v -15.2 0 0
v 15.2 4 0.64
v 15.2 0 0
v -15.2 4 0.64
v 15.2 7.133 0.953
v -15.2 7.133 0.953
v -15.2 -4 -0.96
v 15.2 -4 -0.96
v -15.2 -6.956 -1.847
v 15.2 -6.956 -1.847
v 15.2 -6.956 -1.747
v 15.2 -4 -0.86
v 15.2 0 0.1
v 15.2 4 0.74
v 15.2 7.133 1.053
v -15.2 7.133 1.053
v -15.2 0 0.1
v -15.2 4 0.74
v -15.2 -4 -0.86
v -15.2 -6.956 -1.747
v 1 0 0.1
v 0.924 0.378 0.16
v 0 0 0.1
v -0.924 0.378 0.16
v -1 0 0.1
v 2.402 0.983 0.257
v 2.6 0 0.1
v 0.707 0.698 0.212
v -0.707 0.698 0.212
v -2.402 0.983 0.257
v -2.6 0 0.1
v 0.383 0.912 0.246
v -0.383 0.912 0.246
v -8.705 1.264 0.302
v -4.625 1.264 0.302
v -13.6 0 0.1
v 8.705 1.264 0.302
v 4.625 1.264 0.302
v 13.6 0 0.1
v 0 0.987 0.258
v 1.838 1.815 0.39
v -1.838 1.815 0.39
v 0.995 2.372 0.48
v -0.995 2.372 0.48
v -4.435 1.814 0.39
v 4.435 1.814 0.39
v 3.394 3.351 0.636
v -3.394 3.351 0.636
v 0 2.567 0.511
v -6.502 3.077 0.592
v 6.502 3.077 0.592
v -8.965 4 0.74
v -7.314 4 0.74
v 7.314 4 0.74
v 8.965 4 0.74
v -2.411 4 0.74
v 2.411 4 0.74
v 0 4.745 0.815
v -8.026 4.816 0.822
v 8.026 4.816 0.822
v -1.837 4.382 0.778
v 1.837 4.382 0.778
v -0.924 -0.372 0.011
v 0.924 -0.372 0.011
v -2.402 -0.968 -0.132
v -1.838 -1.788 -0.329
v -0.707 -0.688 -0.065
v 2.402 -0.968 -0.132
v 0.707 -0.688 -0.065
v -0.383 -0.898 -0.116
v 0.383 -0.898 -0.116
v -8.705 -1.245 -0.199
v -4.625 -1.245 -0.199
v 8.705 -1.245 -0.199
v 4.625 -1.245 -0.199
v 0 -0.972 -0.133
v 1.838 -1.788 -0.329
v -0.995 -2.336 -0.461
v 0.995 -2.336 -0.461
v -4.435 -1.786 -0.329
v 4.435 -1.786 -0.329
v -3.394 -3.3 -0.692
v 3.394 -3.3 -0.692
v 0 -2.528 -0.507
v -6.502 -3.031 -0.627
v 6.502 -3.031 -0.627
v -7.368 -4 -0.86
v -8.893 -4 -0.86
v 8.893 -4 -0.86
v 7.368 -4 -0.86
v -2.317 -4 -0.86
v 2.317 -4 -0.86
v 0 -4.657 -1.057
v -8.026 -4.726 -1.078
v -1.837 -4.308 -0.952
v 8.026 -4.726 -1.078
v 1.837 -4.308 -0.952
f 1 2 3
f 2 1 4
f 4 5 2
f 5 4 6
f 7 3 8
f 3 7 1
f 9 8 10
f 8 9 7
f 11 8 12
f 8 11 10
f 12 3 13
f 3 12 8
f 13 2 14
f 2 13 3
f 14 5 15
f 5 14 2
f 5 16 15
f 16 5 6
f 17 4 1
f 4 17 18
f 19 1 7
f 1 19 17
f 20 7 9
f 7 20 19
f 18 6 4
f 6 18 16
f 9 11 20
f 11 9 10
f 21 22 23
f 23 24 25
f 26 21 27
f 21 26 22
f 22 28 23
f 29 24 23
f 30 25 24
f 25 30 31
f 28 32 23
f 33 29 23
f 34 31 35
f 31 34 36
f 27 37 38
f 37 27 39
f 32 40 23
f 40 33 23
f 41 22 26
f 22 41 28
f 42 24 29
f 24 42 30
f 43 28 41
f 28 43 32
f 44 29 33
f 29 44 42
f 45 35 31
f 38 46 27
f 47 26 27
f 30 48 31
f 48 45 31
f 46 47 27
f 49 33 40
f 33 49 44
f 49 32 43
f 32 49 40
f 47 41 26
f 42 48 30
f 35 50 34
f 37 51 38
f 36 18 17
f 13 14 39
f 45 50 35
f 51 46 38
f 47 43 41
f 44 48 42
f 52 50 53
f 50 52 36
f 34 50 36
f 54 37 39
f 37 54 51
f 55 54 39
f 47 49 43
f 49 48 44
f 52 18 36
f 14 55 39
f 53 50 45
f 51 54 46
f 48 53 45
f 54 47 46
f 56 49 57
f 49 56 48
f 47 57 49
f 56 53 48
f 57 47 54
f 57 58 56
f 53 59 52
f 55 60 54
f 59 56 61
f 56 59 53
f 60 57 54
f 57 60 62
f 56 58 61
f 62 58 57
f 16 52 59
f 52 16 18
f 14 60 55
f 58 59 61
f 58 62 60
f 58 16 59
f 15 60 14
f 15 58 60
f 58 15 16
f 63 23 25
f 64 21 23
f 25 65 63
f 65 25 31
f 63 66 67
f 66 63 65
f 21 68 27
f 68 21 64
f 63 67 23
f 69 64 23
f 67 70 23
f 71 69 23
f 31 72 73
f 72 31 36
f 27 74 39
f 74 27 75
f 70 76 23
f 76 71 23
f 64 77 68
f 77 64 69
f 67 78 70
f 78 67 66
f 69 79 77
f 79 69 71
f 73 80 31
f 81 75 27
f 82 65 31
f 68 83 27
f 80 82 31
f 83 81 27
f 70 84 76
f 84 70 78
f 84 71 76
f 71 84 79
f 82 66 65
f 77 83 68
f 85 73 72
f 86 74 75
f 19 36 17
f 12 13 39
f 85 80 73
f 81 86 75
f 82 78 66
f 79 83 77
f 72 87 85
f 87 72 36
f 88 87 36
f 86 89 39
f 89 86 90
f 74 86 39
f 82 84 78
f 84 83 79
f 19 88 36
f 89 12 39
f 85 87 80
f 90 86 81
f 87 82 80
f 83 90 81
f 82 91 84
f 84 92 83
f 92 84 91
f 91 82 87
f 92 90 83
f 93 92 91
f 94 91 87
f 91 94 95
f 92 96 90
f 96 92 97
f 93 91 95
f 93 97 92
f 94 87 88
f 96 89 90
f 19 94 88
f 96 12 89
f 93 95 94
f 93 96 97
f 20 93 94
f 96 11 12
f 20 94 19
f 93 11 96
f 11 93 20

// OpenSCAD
use <../lib.scad>
function ldraw_lib__4638848ic01() = [
// 0 Sticker  1.8 x  3.8 with Black Train Logo (2006, Bold) on Yellow Background (Formed)
// 0 Name: 4638848ic01.dat
// 0 Author: Gerald Lasser [GeraldLasser]
// 0 !LDRAW_ORG Part UPDATE 2023-07
// 0 !LICENSE Licensed under CC BY 4.0 : see CAreadme.txt
// 
// 0 !HELP !ATTACHTO 52031.dat 0 2.6 -50 1 0 0 0 1 0 0 0 1
// 
// 0 BFC CERTIFY CCW
  [0,"BFC","CERTIFY"],
  [0,"BFC","CCW"],
// 
// 0 !KEYWORDS Set 3677
// 
// 0 !HISTORY 2023-12-31 [OrionP] Official Update 2023-07
// 
// 
// 0 // Sticker Box
// 4 16 -38 -1.6 10 38 -1.6 10 38 0 0 -38 0 0
  [4,16,-38,-1.6,10,38,-1.6,10,38,0,0,-38,0,0],
// 4 16 -38 -2.3834 17.8337 38 -2.3834 17.8337 38 -1.6 10 -38 -1.6 10
  [4,16,-38,-2.3834,17.8337,38,-2.3834,17.8337,38,-1.6,10,-38,-1.6,10],
// 4 16 38 0 0 38 2.4 -10 -38 2.4 -10 -38 0 0
  [4,16,38,0,0,38,2.4,-10,-38,2.4,-10,-38,0,0],
// 4 16 38 2.4 -10 38 4.6172 -17.3906 -38 4.6172 -17.3906 -38 2.4 -10
  [4,16,38,2.4,-10,38,4.6172,-17.3906,-38,4.6172,-17.3906,-38,2.4,-10],
// 4 16 38 2.15 -10 38 4.3672 -17.3906 38 4.6172 -17.3906 38 2.4 -10
  [4,16,38,2.15,-10,38,4.3672,-17.3906,38,4.6172,-17.3906,38,2.4,-10],
// 4 16 38 -.25 0 38 2.15 -10 38 2.4 -10 38 0 0
  [4,16,38,-.25,0,38,2.15,-10,38,2.4,-10,38,0,0],
// 4 16 38 -1.85 10 38 -.25 0 38 0 0 38 -1.6 10
  [4,16,38,-1.85,10,38,-.25,0,38,0,0,38,-1.6,10],
// 4 16 38 -2.6334 17.8337 38 -1.85 10 38 -1.6 10 38 -2.3834 17.8337
  [4,16,38,-2.6334,17.8337,38,-1.85,10,38,-1.6,10,38,-2.3834,17.8337],
// 4 16 -38 -2.6334 17.8337 38 -2.6334 17.8337 38 -2.3834 17.8337 -38 -2.3834 17.8337
  [4,16,-38,-2.6334,17.8337,38,-2.6334,17.8337,38,-2.3834,17.8337,-38,-2.3834,17.8337],
// 4 16 -38 -.25 0 -38 -1.85 10 -38 -1.6 10 -38 0 0
  [4,16,-38,-.25,0,-38,-1.85,10,-38,-1.6,10,-38,0,0],
// 4 16 -38 2.15 -10 -38 -.25 0 -38 0 0 -38 2.4 -10
  [4,16,-38,2.15,-10,-38,-.25,0,-38,0,0,-38,2.4,-10],
// 4 16 -38 2.15 -10 -38 2.4 -10 -38 4.6172 -17.3906 -38 4.3672 -17.3906
  [4,16,-38,2.15,-10,-38,2.4,-10,-38,4.6172,-17.3906,-38,4.3672,-17.3906],
// 4 16 -38 -1.85 10 -38 -2.6334 17.8337 -38 -2.3834 17.8337 -38 -1.6 10
  [4,16,-38,-1.85,10,-38,-2.6334,17.8337,-38,-2.3834,17.8337,-38,-1.6,10],
// 4 16 38 4.3672 -17.3906 -38 4.3672 -17.3906 -38 4.6172 -17.3906 38 4.6172 -17.3906
  [4,16,38,4.3672,-17.3906,-38,4.3672,-17.3906,-38,4.6172,-17.3906,38,4.6172,-17.3906],
// 
// 0 // Pattern
// 3 0 2.5 -.25 0 2.3098 -.4012 .9447 0 -.25 0
  [3,0,2.5,-.25,0,2.3098,-.4012,.9447,0,-.25,0],
// 3 0 0 -.25 0 -2.3098 -.4012 .9447 -2.5 -.25 0
  [3,0,0,-.25,0,-2.3098,-.4012,.9447,-2.5,-.25,0],
// 4 14 6.5 -.25 0 6.0053 -.643 2.4563 2.3098 -.4012 .9447 2.5 -.25 0
  [4,14,6.5,-.25,0,6.0053,-.643,2.4563,2.3098,-.4012,.9447,2.5,-.25,0],
// 3 0 2.3098 -.4012 .9447 1.7677 -.5293 1.7455 0 -.25 0
  [3,0,2.3098,-.4012,.9447,1.7677,-.5293,1.7455,0,-.25,0],
// 3 0 -1.7677 -.5293 1.7455 -2.3098 -.4012 .9447 0 -.25 0
  [3,0,-1.7677,-.5293,1.7455,-2.3098,-.4012,.9447,0,-.25,0],
// 4 14 -6.5 -.25 0 -2.5 -.25 0 -2.3098 -.4012 .9447 -6.0053 -.643 2.4563
  [4,14,-6.5,-.25,0,-2.5,-.25,0,-2.3098,-.4012,.9447,-6.0053,-.643,2.4563],
// 3 0 1.7677 -.5293 1.7455 .9567 -.6149 2.2807 0 -.25 0
  [3,0,1.7677,-.5293,1.7455,.9567,-.6149,2.2807,0,-.25,0],
// 3 0 -.9567 -.6149 2.2807 -1.7677 -.5293 1.7455 0 -.25 0
  [3,0,-.9567,-.6149,2.2807,-1.7677,-.5293,1.7455,0,-.25,0],
// 4 0 -6.5 -.25 0 -11.5625 -.7556 3.1598 -21.7625 -.7556 3.1598 -34 -.25 0
  [4,0,-6.5,-.25,0,-11.5625,-.7556,3.1598,-21.7625,-.7556,3.1598,-34,-.25,0],
// 4 0 34 -.25 0 21.7625 -.7556 3.1598 11.5625 -.7556 3.1598 6.5 -.25 0
  [4,0,34,-.25,0,21.7625,-.7556,3.1598,11.5625,-.7556,3.1598,6.5,-.25,0],
// 3 0 .9567 -.6149 2.2807 0 -.645 2.4686 0 -.25 0
  [3,0,.9567,-.6149,2.2807,0,-.645,2.4686,0,-.25,0],
// 3 0 0 -.645 2.4686 -.9567 -.6149 2.2807 0 -.25 0
  [3,0,0,-.645,2.4686,-.9567,-.6149,2.2807,0,-.25,0],
// 4 14 6.0053 -.643 2.4563 4.5961 -.9761 4.5384 1.7677 -.5293 1.7455 2.3098 -.4012 .9447
  [4,14,6.0053,-.643,2.4563,4.5961,-.9761,4.5384,1.7677,-.5293,1.7455,2.3098,-.4012,.9447],
// 4 14 -6.0053 -.643 2.4563 -2.3098 -.4012 .9447 -1.7677 -.5293 1.7455 -4.5961 -.9761 4.5384
  [4,14,-6.0053,-.643,2.4563,-2.3098,-.4012,.9447,-1.7677,-.5293,1.7455,-4.5961,-.9761,4.5384],
// 4 14 2.4876 -1.1988 5.9299 .9567 -.6149 2.2807 1.7677 -.5293 1.7455 4.5961 -.9761 4.5384
  [4,14,2.4876,-1.1988,5.9299,.9567,-.6149,2.2807,1.7677,-.5293,1.7455,4.5961,-.9761,4.5384],
// 4 14 -1.7677 -.5293 1.7455 -.9567 -.6149 2.2807 -2.4876 -1.1988 5.9299 -4.5961 -.9761 4.5384
  [4,14,-1.7677,-.5293,1.7455,-.9567,-.6149,2.2807,-2.4876,-1.1988,5.9299,-4.5961,-.9761,4.5384],
// 3 0 -11.0868 -.9756 4.5347 -11.5625 -.7556 3.1598 -6.5 -.25 0
  [3,0,-11.0868,-.9756,4.5347,-11.5625,-.7556,3.1598,-6.5,-.25,0],
// 3 0 11.5625 -.7556 3.1598 11.0868 -.9756 4.5347 6.5 -.25 0
  [3,0,11.5625,-.7556,3.1598,11.0868,-.9756,4.5347,6.5,-.25,0],
// 3 0 8.4852 -1.5906 8.3786 6.0053 -.643 2.4563 6.5 -.25 0
  [3,0,8.4852,-1.5906,8.3786,6.0053,-.643,2.4563,6.5,-.25,0],
// 3 0 -6.0053 -.643 2.4563 -8.4852 -1.5906 8.3786 -6.5 -.25 0
  [3,0,-6.0053,-.643,2.4563,-8.4852,-1.5906,8.3786,-6.5,-.25,0],
// 3 0 -8.4852 -1.5906 8.3786 -11.0868 -.9756 4.5347 -6.5 -.25 0
  [3,0,-8.4852,-1.5906,8.3786,-11.0868,-.9756,4.5347,-6.5,-.25,0],
// 3 0 11.0868 -.9756 4.5347 8.4852 -1.5906 8.3786 6.5 -.25 0
  [3,0,11.0868,-.9756,4.5347,8.4852,-1.5906,8.3786,6.5,-.25,0],
// 4 14 -.9567 -.6149 2.2807 0 -.645 2.4686 0 -1.2769 6.4184 -2.4876 -1.1988 5.9299
  [4,14,-.9567,-.6149,2.2807,0,-.645,2.4686,0,-1.2769,6.4184,-2.4876,-1.1988,5.9299],
// 4 14 .9567 -.6149 2.2807 2.4876 -1.1988 5.9299 0 -1.2769 6.4184 0 -.645 2.4686
  [4,14,.9567,-.6149,2.2807,2.4876,-1.1988,5.9299,0,-1.2769,6.4184,0,-.645,2.4686],
// 3 0 8.4852 -1.5906 8.3786 4.5961 -.9761 4.5384 6.0053 -.643 2.4563
  [3,0,8.4852,-1.5906,8.3786,4.5961,-.9761,4.5384,6.0053,-.643,2.4563],
// 3 0 -4.5961 -.9761 4.5384 -8.4852 -1.5906 8.3786 -6.0053 -.643 2.4563
  [3,0,-4.5961,-.9761,4.5384,-8.4852,-1.5906,8.3786,-6.0053,-.643,2.4563],
// 3 14 -11.5625 -.7556 3.1598 -16.255 -1.481 7.6936 -21.7625 -.7556 3.1598
  [3,14,-11.5625,-.7556,3.1598,-16.255,-1.481,7.6936,-21.7625,-.7556,3.1598],
// 3 14 21.7625 -.7556 3.1598 16.255 -1.481 7.6936 11.5625 -.7556 3.1598
  [3,14,21.7625,-.7556,3.1598,16.255,-1.481,7.6936,11.5625,-.7556,3.1598],
// 3 14 -34 -.25 0 -38 -1.85 10 -38 -.25 0
  [3,14,-34,-.25,0,-38,-1.85,10,-38,-.25,0],
// 3 14 38 -.25 0 38 -1.85 10 34 -.25 0
  [3,14,38,-.25,0,38,-1.85,10,34,-.25,0],
// 3 14 -11.0868 -.9756 4.5347 -16.255 -1.481 7.6936 -11.5625 -.7556 3.1598
  [3,14,-11.0868,-.9756,4.5347,-16.255,-1.481,7.6936,-11.5625,-.7556,3.1598],
// 3 14 16.255 -1.481 7.6936 11.0868 -.9756 4.5347 11.5625 -.7556 3.1598
  [3,14,16.255,-1.481,7.6936,11.0868,-.9756,4.5347,11.5625,-.7556,3.1598],
// 3 0 8.4852 -1.5906 8.3786 2.4876 -1.1988 5.9299 4.5961 -.9761 4.5384
  [3,0,8.4852,-1.5906,8.3786,2.4876,-1.1988,5.9299,4.5961,-.9761,4.5384],
// 3 0 -2.4876 -1.1988 5.9299 -8.4852 -1.5906 8.3786 -4.5961 -.9761 4.5384
  [3,0,-2.4876,-1.1988,5.9299,-8.4852,-1.5906,8.3786,-4.5961,-.9761,4.5384],
// 4 0 -16.255 -1.481 7.6936 -18.2845 -1.85 10 -22.4125 -1.85 10 -34 -.25 0
  [4,0,-16.255,-1.481,7.6936,-18.2845,-1.85,10,-22.4125,-1.85,10,-34,-.25,0],
// 3 0 -21.7625 -.7556 3.1598 -16.255 -1.481 7.6936 -34 -.25 0
  [3,0,-21.7625,-.7556,3.1598,-16.255,-1.481,7.6936,-34,-.25,0],
// 4 0 18.2845 -1.85 10 16.255 -1.481 7.6936 21.7625 -.7556 3.1598 34 -.25 0
  [4,0,18.2845,-1.85,10,16.255,-1.481,7.6936,21.7625,-.7556,3.1598,34,-.25,0],
// 3 0 22.4125 -1.85 10 18.2845 -1.85 10 34 -.25 0
  [3,0,22.4125,-1.85,10,18.2845,-1.85,10,34,-.25,0],
// 3 0 8.4852 -1.5906 8.3786 0 -1.2769 6.4184 2.4876 -1.1988 5.9299
  [3,0,8.4852,-1.5906,8.3786,0,-1.2769,6.4184,2.4876,-1.1988,5.9299],
// 3 0 0 -1.2769 6.4184 -8.4852 -1.5906 8.3786 -2.4876 -1.1988 5.9299
  [3,0,0,-1.2769,6.4184,-8.4852,-1.5906,8.3786,-2.4876,-1.1988,5.9299],
// 3 14 -22.4125 -1.85 10 -38 -1.85 10 -34 -.25 0
  [3,14,-22.4125,-1.85,10,-38,-1.85,10,-34,-.25,0],
// 3 14 38 -1.85 10 22.4125 -1.85 10 34 -.25 0
  [3,14,38,-1.85,10,22.4125,-1.85,10,34,-.25,0],
// 3 14 -18.2845 -1.85 10 -16.255 -1.481 7.6936 -11.0868 -.9756 4.5347
  [3,14,-18.2845,-1.85,10,-16.255,-1.481,7.6936,-11.0868,-.9756,4.5347],
// 3 14 16.255 -1.481 7.6936 18.2845 -1.85 10 11.0868 -.9756 4.5347
  [3,14,16.255,-1.481,7.6936,18.2845,-1.85,10,11.0868,-.9756,4.5347],
// 3 14 -8.4852 -1.5906 8.3786 -18.2845 -1.85 10 -11.0868 -.9756 4.5347
  [3,14,-8.4852,-1.5906,8.3786,-18.2845,-1.85,10,-11.0868,-.9756,4.5347],
// 3 14 18.2845 -1.85 10 8.4852 -1.5906 8.3786 11.0868 -.9756 4.5347
  [3,14,18.2845,-1.85,10,8.4852,-1.5906,8.3786,11.0868,-.9756,4.5347],
// 4 0 6.0283 -1.85 10 -6.0283 -1.85 10 -8.4852 -1.5906 8.3786 0 -1.2769 6.4184
  [4,0,6.0283,-1.85,10,-6.0283,-1.85,10,-8.4852,-1.5906,8.3786,0,-1.2769,6.4184],
// 3 0 8.4852 -1.5906 8.3786 6.0283 -1.85 10 0 -1.2769 6.4184
  [3,0,8.4852,-1.5906,8.3786,6.0283,-1.85,10,0,-1.2769,6.4184],
// 3 14 -6.0283 -1.85 10 -18.2845 -1.85 10 -8.4852 -1.5906 8.3786
  [3,14,-6.0283,-1.85,10,-18.2845,-1.85,10,-8.4852,-1.5906,8.3786],
// 3 14 6.0283 -1.85 10 8.4852 -1.5906 8.3786 18.2845 -1.85 10
  [3,14,6.0283,-1.85,10,8.4852,-1.5906,8.3786,18.2845,-1.85,10],
// 3 0 6.0283 -1.85 10 0 -2.0364 11.8635 -6.0283 -1.85 10
  [3,0,6.0283,-1.85,10,0,-2.0364,11.8635,-6.0283,-1.85,10],
// 3 0 -18.2845 -1.85 10 -20.0662 -2.054 12.0404 -22.4125 -1.85 10
  [3,0,-18.2845,-1.85,10,-20.0662,-2.054,12.0404,-22.4125,-1.85,10],
// 3 0 22.4125 -1.85 10 20.0662 -2.054 12.0404 18.2845 -1.85 10
  [3,0,22.4125,-1.85,10,20.0662,-2.054,12.0404,18.2845,-1.85,10],
// 4 14 -6.0283 -1.85 10 -4.5924 -1.9455 10.9548 -20.0662 -2.054 12.0404 -18.2845 -1.85 10
  [4,14,-6.0283,-1.85,10,-4.5924,-1.9455,10.9548,-20.0662,-2.054,12.0404,-18.2845,-1.85,10],
// 4 14 20.0662 -2.054 12.0404 4.5924 -1.9455 10.9548 6.0283 -1.85 10 18.2845 -1.85 10
  [4,14,20.0662,-2.054,12.0404,4.5924,-1.9455,10.9548,6.0283,-1.85,10,18.2845,-1.85,10],
// 3 0 -6.0283 -1.85 10 0 -2.0364 11.8635 -4.5924 -1.9455 10.9548
  [3,0,-6.0283,-1.85,10,0,-2.0364,11.8635,-4.5924,-1.9455,10.9548],
// 3 0 4.5924 -1.9455 10.9548 0 -2.0364 11.8635 6.0283 -1.85 10
  [3,0,4.5924,-1.9455,10.9548,0,-2.0364,11.8635,6.0283,-1.85,10],
// 4 14 -22.4125 -1.85 10 -20.0662 -2.054 12.0404 -38 -2.6334 17.8337 -38 -1.85 10
  [4,14,-22.4125,-1.85,10,-20.0662,-2.054,12.0404,-38,-2.6334,17.8337,-38,-1.85,10],
// 3 14 38 -1.85 10 20.0662 -2.054 12.0404 22.4125 -1.85 10
  [3,14,38,-1.85,10,20.0662,-2.054,12.0404,22.4125,-1.85,10],
// 3 14 0 -2.0364 11.8635 -20.0662 -2.054 12.0404 -4.5924 -1.9455 10.9548
  [3,14,0,-2.0364,11.8635,-20.0662,-2.054,12.0404,-4.5924,-1.9455,10.9548],
// 3 14 0 -2.0364 11.8635 4.5924 -1.9455 10.9548 20.0662 -2.054 12.0404
  [3,14,0,-2.0364,11.8635,4.5924,-1.9455,10.9548,20.0662,-2.054,12.0404],
// 3 14 0 -2.0364 11.8635 -38 -2.6334 17.8337 -20.0662 -2.054 12.0404
  [3,14,0,-2.0364,11.8635,-38,-2.6334,17.8337,-20.0662,-2.054,12.0404],
// 3 14 38 -2.6334 17.8337 20.0662 -2.054 12.0404 38 -1.85 10
  [3,14,38,-2.6334,17.8337,20.0662,-2.054,12.0404,38,-1.85,10],
// 4 14 20.0662 -2.054 12.0404 38 -2.6334 17.8337 -38 -2.6334 17.8337 0 -2.0364 11.8635
  [4,14,20.0662,-2.054,12.0404,38,-2.6334,17.8337,-38,-2.6334,17.8337,0,-2.0364,11.8635],
// 3 0 -2.3098 -.0267 -.9303 0 -.25 0 -2.5 -.25 0
  [3,0,-2.3098,-.0267,-.9303,0,-.25,0,-2.5,-.25,0],
// 3 0 2.3098 -.0267 -.9303 2.5 -.25 0 0 -.25 0
  [3,0,2.3098,-.0267,-.9303,2.5,-.25,0,0,-.25,0],
// 4 14 -6.5 -.25 0 -6.0053 .3305 -2.4189 -2.3098 -.0267 -.9303 -2.5 -.25 0
  [4,14,-6.5,-.25,0,-6.0053,.3305,-2.4189,-2.3098,-.0267,-.9303,-2.5,-.25,0],
// 4 14 -1.7677 .1625 -1.7189 -2.3098 -.0267 -.9303 -6.0053 .3305 -2.4189 -4.5961 .8226 -4.4692
  [4,14,-1.7677,.1625,-1.7189,-2.3098,-.0267,-.9303,-6.0053,.3305,-2.4189,-4.5961,.8226,-4.4692],
// 4 14 2.3098 -.0267 -.9303 6.0053 .3305 -2.4189 6.5 -.25 0 2.5 -.25 0
  [4,14,2.3098,-.0267,-.9303,6.0053,.3305,-2.4189,6.5,-.25,0,2.5,-.25,0],
// 3 0 -2.3098 -.0267 -.9303 -1.7677 .1625 -1.7189 0 -.25 0
  [3,0,-2.3098,-.0267,-.9303,-1.7677,.1625,-1.7189,0,-.25,0],
// 3 0 1.7677 .1625 -1.7189 2.3098 -.0267 -.9303 0 -.25 0
  [3,0,1.7677,.1625,-1.7189,2.3098,-.0267,-.9303,0,-.25,0],
// 3 0 -1.7677 .1625 -1.7189 -.9567 .289 -2.246 0 -.25 0
  [3,0,-1.7677,.1625,-1.7189,-.9567,.289,-2.246,0,-.25,0],
// 3 0 .9567 .289 -2.246 1.7677 .1625 -1.7189 0 -.25 0
  [3,0,.9567,.289,-2.246,1.7677,.1625,-1.7189,0,-.25,0],
// 4 0 -21.7625 .4968 -3.1116 -11.5625 .4968 -3.1116 -6.5 -.25 0 -34 -.25 0
  [4,0,-21.7625,.4968,-3.1116,-11.5625,.4968,-3.1116,-6.5,-.25,0,-34,-.25,0],
// 4 0 11.5625 .4968 -3.1116 21.7625 .4968 -3.1116 34 -.25 0 6.5 -.25 0
  [4,0,11.5625,.4968,-3.1116,21.7625,.4968,-3.1116,34,-.25,0,6.5,-.25,0],
// 3 0 -.9567 .289 -2.246 0 .3334 -2.431 0 -.25 0
  [3,0,-.9567,.289,-2.246,0,.3334,-2.431,0,-.25,0],
// 3 0 0 .3334 -2.431 .9567 .289 -2.246 0 -.25 0
  [3,0,0,.3334,-2.431,.9567,.289,-2.246,0,-.25,0],
// 4 14 6.0053 .3305 -2.4189 2.3098 -.0267 -.9303 1.7677 .1625 -1.7189 4.5961 .8226 -4.4692
  [4,14,6.0053,.3305,-2.4189,2.3098,-.0267,-.9303,1.7677,.1625,-1.7189,4.5961,.8226,-4.4692],
// 4 14 -2.4876 1.1515 -5.8395 -.9567 .289 -2.246 -1.7677 .1625 -1.7189 -4.5961 .8226 -4.4692
  [4,14,-2.4876,1.1515,-5.8395,-.9567,.289,-2.246,-1.7677,.1625,-1.7189,-4.5961,.8226,-4.4692],
// 4 14 1.7677 .1625 -1.7189 .9567 .289 -2.246 2.4876 1.1515 -5.8395 4.5961 .8226 -4.4692
  [4,14,1.7677,.1625,-1.7189,.9567,.289,-2.246,2.4876,1.1515,-5.8395,4.5961,.8226,-4.4692],
// 3 0 -11.5625 .4968 -3.1116 -11.0868 .8217 -4.4656 -6.5 -.25 0
  [3,0,-11.5625,.4968,-3.1116,-11.0868,.8217,-4.4656,-6.5,-.25,0],
// 3 0 11.0868 .8217 -4.4656 11.5625 .4968 -3.1116 6.5 -.25 0
  [3,0,11.0868,.8217,-4.4656,11.5625,.4968,-3.1116,6.5,-.25,0],
// 3 0 -8.4852 1.7302 -8.2509 -6.0053 .3305 -2.4189 -6.5 -.25 0
  [3,0,-8.4852,1.7302,-8.2509,-6.0053,.3305,-2.4189,-6.5,-.25,0],
// 3 0 6.0053 .3305 -2.4189 8.4852 1.7302 -8.2509 6.5 -.25 0
  [3,0,6.0053,.3305,-2.4189,8.4852,1.7302,-8.2509,6.5,-.25,0],
// 3 0 -11.0868 .8217 -4.4656 -8.4852 1.7302 -8.2509 -6.5 -.25 0
  [3,0,-11.0868,.8217,-4.4656,-8.4852,1.7302,-8.2509,-6.5,-.25,0],
// 3 0 8.4852 1.7302 -8.2509 11.0868 .8217 -4.4656 6.5 -.25 0
  [3,0,8.4852,1.7302,-8.2509,11.0868,.8217,-4.4656,6.5,-.25,0],
// 4 14 -.9567 .289 -2.246 -2.4876 1.1515 -5.8395 0 1.2669 -6.3205 0 .3334 -2.431
  [4,14,-.9567,.289,-2.246,-2.4876,1.1515,-5.8395,0,1.2669,-6.3205,0,.3334,-2.431],
// 4 14 .9567 .289 -2.246 0 .3334 -2.431 0 1.2669 -6.3205 2.4876 1.1515 -5.8395
  [4,14,.9567,.289,-2.246,0,.3334,-2.431,0,1.2669,-6.3205,2.4876,1.1515,-5.8395],
// 3 0 -8.4852 1.7302 -8.2509 -4.5961 .8226 -4.4692 -6.0053 .3305 -2.4189
  [3,0,-8.4852,1.7302,-8.2509,-4.5961,.8226,-4.4692,-6.0053,.3305,-2.4189],
// 3 0 4.5961 .8226 -4.4692 8.4852 1.7302 -8.2509 6.0053 .3305 -2.4189
  [3,0,4.5961,.8226,-4.4692,8.4852,1.7302,-8.2509,6.0053,.3305,-2.4189],
// 3 14 -16.255 1.5683 -7.5764 -11.5625 .4968 -3.1116 -21.7625 .4968 -3.1116
  [3,14,-16.255,1.5683,-7.5764,-11.5625,.4968,-3.1116,-21.7625,.4968,-3.1116],
// 3 14 16.255 1.5683 -7.5764 21.7625 .4968 -3.1116 11.5625 .4968 -3.1116
  [3,14,16.255,1.5683,-7.5764,21.7625,.4968,-3.1116,11.5625,.4968,-3.1116],
// 3 14 -38 2.15 -10 -34 -.25 0 -38 -.25 0
  [3,14,-38,2.15,-10,-34,-.25,0,-38,-.25,0],
// 3 14 38 2.15 -10 38 -.25 0 34 -.25 0
  [3,14,38,2.15,-10,38,-.25,0,34,-.25,0],
// 3 14 -16.255 1.5683 -7.5764 -11.0868 .8217 -4.4656 -11.5625 .4968 -3.1116
  [3,14,-16.255,1.5683,-7.5764,-11.0868,.8217,-4.4656,-11.5625,.4968,-3.1116],
// 3 14 11.0868 .8217 -4.4656 16.255 1.5683 -7.5764 11.5625 .4968 -3.1116
  [3,14,11.0868,.8217,-4.4656,16.255,1.5683,-7.5764,11.5625,.4968,-3.1116],
// 3 0 -8.4852 1.7302 -8.2509 -2.4876 1.1515 -5.8395 -4.5961 .8226 -4.4692
  [3,0,-8.4852,1.7302,-8.2509,-2.4876,1.1515,-5.8395,-4.5961,.8226,-4.4692],
// 3 0 2.4876 1.1515 -5.8395 8.4852 1.7302 -8.2509 4.5961 .8226 -4.4692
  [3,0,2.4876,1.1515,-5.8395,8.4852,1.7302,-8.2509,4.5961,.8226,-4.4692],
// 4 0 -18.4207 2.15 -10 -16.255 1.5683 -7.5764 -21.7625 .4968 -3.1116 -34 -.25 0
  [4,0,-18.4207,2.15,-10,-16.255,1.5683,-7.5764,-21.7625,.4968,-3.1116,-34,-.25,0],
// 3 0 -22.2331 2.15 -10 -18.4207 2.15 -10 -34 -.25 0
  [3,0,-22.2331,2.15,-10,-18.4207,2.15,-10,-34,-.25,0],
// 4 0 16.255 1.5683 -7.5764 18.4207 2.15 -10 22.2331 2.15 -10 34 -.25 0
  [4,0,16.255,1.5683,-7.5764,18.4207,2.15,-10,22.2331,2.15,-10,34,-.25,0],
// 3 0 21.7625 .4968 -3.1116 16.255 1.5683 -7.5764 34 -.25 0
  [3,0,21.7625,.4968,-3.1116,16.255,1.5683,-7.5764,34,-.25,0],
// 3 0 -8.4852 1.7302 -8.2509 0 1.2669 -6.3205 -2.4876 1.1515 -5.8395
  [3,0,-8.4852,1.7302,-8.2509,0,1.2669,-6.3205,-2.4876,1.1515,-5.8395],
// 3 0 0 1.2669 -6.3205 8.4852 1.7302 -8.2509 2.4876 1.1515 -5.8395
  [3,0,0,1.2669,-6.3205,8.4852,1.7302,-8.2509,2.4876,1.1515,-5.8395],
// 3 14 -38 2.15 -10 -22.2331 2.15 -10 -34 -.25 0
  [3,14,-38,2.15,-10,-22.2331,2.15,-10,-34,-.25,0],
// 3 14 22.2331 2.15 -10 38 2.15 -10 34 -.25 0
  [3,14,22.2331,2.15,-10,38,2.15,-10,34,-.25,0],
// 3 14 -16.255 1.5683 -7.5764 -18.4207 2.15 -10 -11.0868 .8217 -4.4656
  [3,14,-16.255,1.5683,-7.5764,-18.4207,2.15,-10,-11.0868,.8217,-4.4656],
// 3 14 18.4207 2.15 -10 16.255 1.5683 -7.5764 11.0868 .8217 -4.4656
  [3,14,18.4207,2.15,-10,16.255,1.5683,-7.5764,11.0868,.8217,-4.4656],
// 3 14 -18.4207 2.15 -10 -8.4852 1.7302 -8.2509 -11.0868 .8217 -4.4656
  [3,14,-18.4207,2.15,-10,-8.4852,1.7302,-8.2509,-11.0868,.8217,-4.4656],
// 3 14 8.4852 1.7302 -8.2509 18.4207 2.15 -10 11.0868 .8217 -4.4656
  [3,14,8.4852,1.7302,-8.2509,18.4207,2.15,-10,11.0868,.8217,-4.4656],
// 3 0 -8.4852 1.7302 -8.2509 -5.7937 2.15 -10 0 1.2669 -6.3205
  [3,0,-8.4852,1.7302,-8.2509,-5.7937,2.15,-10,0,1.2669,-6.3205],
// 4 0 -5.7937 2.15 -10 5.7937 2.15 -10 8.4852 1.7302 -8.2509 0 1.2669 -6.3205
  [4,0,-5.7937,2.15,-10,5.7937,2.15,-10,8.4852,1.7302,-8.2509,0,1.2669,-6.3205],
// 3 14 -5.7937 2.15 -10 -8.4852 1.7302 -8.2509 -18.4207 2.15 -10
  [3,14,-5.7937,2.15,-10,-8.4852,1.7302,-8.2509,-18.4207,2.15,-10],
// 3 14 5.7937 2.15 -10 18.4207 2.15 -10 8.4852 1.7302 -8.2509
  [3,14,5.7937,2.15,-10,18.4207,2.15,-10,8.4852,1.7302,-8.2509],
// 3 0 0 2.6431 -11.6437 5.7937 2.15 -10 -5.7937 2.15 -10
  [3,0,0,2.6431,-11.6437,5.7937,2.15,-10,-5.7937,2.15,-10],
// 4 14 -4.5924 2.3807 -10.769 -5.7937 2.15 -10 -18.4207 2.15 -10 -20.0662 2.6942 -11.814
  [4,14,-4.5924,2.3807,-10.769,-5.7937,2.15,-10,-18.4207,2.15,-10,-20.0662,2.6942,-11.814],
// 4 14 4.5924 2.3807 -10.769 20.0662 2.6942 -11.814 18.4207 2.15 -10 5.7937 2.15 -10
  [4,14,4.5924,2.3807,-10.769,20.0662,2.6942,-11.814,18.4207,2.15,-10,5.7937,2.15,-10],
// 3 0 0 2.6431 -11.6437 -5.7937 2.15 -10 -4.5924 2.3807 -10.769
  [3,0,0,2.6431,-11.6437,-5.7937,2.15,-10,-4.5924,2.3807,-10.769],
// 3 0 0 2.6431 -11.6437 4.5924 2.3807 -10.769 5.7937 2.15 -10
  [3,0,0,2.6431,-11.6437,4.5924,2.3807,-10.769,5.7937,2.15,-10],
// 3 0 -20.0662 2.6942 -11.814 -18.4207 2.15 -10 -22.2331 2.15 -10
  [3,0,-20.0662,2.6942,-11.814,-18.4207,2.15,-10,-22.2331,2.15,-10],
// 3 0 20.0662 2.6942 -11.814 22.2331 2.15 -10 18.4207 2.15 -10
  [3,0,20.0662,2.6942,-11.814,22.2331,2.15,-10,18.4207,2.15,-10],
// 3 14 -38 2.15 -10 -20.0662 2.6942 -11.814 -22.2331 2.15 -10
  [3,14,-38,2.15,-10,-20.0662,2.6942,-11.814,-22.2331,2.15,-10],
// 3 14 20.0662 2.6942 -11.814 38 2.15 -10 22.2331 2.15 -10
  [3,14,20.0662,2.6942,-11.814,38,2.15,-10,22.2331,2.15,-10],
// 3 14 0 2.6431 -11.6437 -4.5924 2.3807 -10.769 -20.0662 2.6942 -11.814
  [3,14,0,2.6431,-11.6437,-4.5924,2.3807,-10.769,-20.0662,2.6942,-11.814],
// 3 14 0 2.6431 -11.6437 20.0662 2.6942 -11.814 4.5924 2.3807 -10.769
  [3,14,0,2.6431,-11.6437,20.0662,2.6942,-11.814,4.5924,2.3807,-10.769],
// 3 14 -38 4.3672 -17.3906 0 2.6431 -11.6437 -20.0662 2.6942 -11.814
  [3,14,-38,4.3672,-17.3906,0,2.6431,-11.6437,-20.0662,2.6942,-11.814],
// 3 14 20.0662 2.6942 -11.814 38 4.3672 -17.3906 38 2.15 -10
  [3,14,20.0662,2.6942,-11.814,38,4.3672,-17.3906,38,2.15,-10],
// 3 14 -38 4.3672 -17.3906 -20.0662 2.6942 -11.814 -38 2.15 -10
  [3,14,-38,4.3672,-17.3906,-20.0662,2.6942,-11.814,-38,2.15,-10],
// 4 14 -38 4.3672 -17.3906 38 4.3672 -17.3906 20.0662 2.6942 -11.814 0 2.6431 -11.6437
  [4,14,-38,4.3672,-17.3906,38,4.3672,-17.3906,20.0662,2.6942,-11.814,0,2.6431,-11.6437],
// 
// 5 24 -38 2.15 -10 38 2.15 -10 38 4.3672 -17.3906 38 -.25 0
  [5,24,-38,2.15,-10,38,2.15,-10,38,4.3672,-17.3906,38,-.25,0],
// 5 24 -38 -.25 0 38 -.25 0 38 -1.85 10 38 2.15 -10
  [5,24,-38,-.25,0,38,-.25,0,38,-1.85,10,38,2.15,-10],
// 5 24 -38 -1.85 10 38 -1.85 10 38 -2.6334 17.8337 38 -.25 0
  [5,24,-38,-1.85,10,38,-1.85,10,38,-2.6334,17.8337,38,-.25,0],
];
module ldraw_lib__4638848ic01(step=0, col=false, unit=2/5, alt=false, line=0.2, solid=!$preview)
    makepoly(ldraw_lib__4638848ic01(), step=step, col=col, unit=unit, alt=alt, line=line, solid=solid);
ldraw_lib__4638848ic01(line=0.2);
